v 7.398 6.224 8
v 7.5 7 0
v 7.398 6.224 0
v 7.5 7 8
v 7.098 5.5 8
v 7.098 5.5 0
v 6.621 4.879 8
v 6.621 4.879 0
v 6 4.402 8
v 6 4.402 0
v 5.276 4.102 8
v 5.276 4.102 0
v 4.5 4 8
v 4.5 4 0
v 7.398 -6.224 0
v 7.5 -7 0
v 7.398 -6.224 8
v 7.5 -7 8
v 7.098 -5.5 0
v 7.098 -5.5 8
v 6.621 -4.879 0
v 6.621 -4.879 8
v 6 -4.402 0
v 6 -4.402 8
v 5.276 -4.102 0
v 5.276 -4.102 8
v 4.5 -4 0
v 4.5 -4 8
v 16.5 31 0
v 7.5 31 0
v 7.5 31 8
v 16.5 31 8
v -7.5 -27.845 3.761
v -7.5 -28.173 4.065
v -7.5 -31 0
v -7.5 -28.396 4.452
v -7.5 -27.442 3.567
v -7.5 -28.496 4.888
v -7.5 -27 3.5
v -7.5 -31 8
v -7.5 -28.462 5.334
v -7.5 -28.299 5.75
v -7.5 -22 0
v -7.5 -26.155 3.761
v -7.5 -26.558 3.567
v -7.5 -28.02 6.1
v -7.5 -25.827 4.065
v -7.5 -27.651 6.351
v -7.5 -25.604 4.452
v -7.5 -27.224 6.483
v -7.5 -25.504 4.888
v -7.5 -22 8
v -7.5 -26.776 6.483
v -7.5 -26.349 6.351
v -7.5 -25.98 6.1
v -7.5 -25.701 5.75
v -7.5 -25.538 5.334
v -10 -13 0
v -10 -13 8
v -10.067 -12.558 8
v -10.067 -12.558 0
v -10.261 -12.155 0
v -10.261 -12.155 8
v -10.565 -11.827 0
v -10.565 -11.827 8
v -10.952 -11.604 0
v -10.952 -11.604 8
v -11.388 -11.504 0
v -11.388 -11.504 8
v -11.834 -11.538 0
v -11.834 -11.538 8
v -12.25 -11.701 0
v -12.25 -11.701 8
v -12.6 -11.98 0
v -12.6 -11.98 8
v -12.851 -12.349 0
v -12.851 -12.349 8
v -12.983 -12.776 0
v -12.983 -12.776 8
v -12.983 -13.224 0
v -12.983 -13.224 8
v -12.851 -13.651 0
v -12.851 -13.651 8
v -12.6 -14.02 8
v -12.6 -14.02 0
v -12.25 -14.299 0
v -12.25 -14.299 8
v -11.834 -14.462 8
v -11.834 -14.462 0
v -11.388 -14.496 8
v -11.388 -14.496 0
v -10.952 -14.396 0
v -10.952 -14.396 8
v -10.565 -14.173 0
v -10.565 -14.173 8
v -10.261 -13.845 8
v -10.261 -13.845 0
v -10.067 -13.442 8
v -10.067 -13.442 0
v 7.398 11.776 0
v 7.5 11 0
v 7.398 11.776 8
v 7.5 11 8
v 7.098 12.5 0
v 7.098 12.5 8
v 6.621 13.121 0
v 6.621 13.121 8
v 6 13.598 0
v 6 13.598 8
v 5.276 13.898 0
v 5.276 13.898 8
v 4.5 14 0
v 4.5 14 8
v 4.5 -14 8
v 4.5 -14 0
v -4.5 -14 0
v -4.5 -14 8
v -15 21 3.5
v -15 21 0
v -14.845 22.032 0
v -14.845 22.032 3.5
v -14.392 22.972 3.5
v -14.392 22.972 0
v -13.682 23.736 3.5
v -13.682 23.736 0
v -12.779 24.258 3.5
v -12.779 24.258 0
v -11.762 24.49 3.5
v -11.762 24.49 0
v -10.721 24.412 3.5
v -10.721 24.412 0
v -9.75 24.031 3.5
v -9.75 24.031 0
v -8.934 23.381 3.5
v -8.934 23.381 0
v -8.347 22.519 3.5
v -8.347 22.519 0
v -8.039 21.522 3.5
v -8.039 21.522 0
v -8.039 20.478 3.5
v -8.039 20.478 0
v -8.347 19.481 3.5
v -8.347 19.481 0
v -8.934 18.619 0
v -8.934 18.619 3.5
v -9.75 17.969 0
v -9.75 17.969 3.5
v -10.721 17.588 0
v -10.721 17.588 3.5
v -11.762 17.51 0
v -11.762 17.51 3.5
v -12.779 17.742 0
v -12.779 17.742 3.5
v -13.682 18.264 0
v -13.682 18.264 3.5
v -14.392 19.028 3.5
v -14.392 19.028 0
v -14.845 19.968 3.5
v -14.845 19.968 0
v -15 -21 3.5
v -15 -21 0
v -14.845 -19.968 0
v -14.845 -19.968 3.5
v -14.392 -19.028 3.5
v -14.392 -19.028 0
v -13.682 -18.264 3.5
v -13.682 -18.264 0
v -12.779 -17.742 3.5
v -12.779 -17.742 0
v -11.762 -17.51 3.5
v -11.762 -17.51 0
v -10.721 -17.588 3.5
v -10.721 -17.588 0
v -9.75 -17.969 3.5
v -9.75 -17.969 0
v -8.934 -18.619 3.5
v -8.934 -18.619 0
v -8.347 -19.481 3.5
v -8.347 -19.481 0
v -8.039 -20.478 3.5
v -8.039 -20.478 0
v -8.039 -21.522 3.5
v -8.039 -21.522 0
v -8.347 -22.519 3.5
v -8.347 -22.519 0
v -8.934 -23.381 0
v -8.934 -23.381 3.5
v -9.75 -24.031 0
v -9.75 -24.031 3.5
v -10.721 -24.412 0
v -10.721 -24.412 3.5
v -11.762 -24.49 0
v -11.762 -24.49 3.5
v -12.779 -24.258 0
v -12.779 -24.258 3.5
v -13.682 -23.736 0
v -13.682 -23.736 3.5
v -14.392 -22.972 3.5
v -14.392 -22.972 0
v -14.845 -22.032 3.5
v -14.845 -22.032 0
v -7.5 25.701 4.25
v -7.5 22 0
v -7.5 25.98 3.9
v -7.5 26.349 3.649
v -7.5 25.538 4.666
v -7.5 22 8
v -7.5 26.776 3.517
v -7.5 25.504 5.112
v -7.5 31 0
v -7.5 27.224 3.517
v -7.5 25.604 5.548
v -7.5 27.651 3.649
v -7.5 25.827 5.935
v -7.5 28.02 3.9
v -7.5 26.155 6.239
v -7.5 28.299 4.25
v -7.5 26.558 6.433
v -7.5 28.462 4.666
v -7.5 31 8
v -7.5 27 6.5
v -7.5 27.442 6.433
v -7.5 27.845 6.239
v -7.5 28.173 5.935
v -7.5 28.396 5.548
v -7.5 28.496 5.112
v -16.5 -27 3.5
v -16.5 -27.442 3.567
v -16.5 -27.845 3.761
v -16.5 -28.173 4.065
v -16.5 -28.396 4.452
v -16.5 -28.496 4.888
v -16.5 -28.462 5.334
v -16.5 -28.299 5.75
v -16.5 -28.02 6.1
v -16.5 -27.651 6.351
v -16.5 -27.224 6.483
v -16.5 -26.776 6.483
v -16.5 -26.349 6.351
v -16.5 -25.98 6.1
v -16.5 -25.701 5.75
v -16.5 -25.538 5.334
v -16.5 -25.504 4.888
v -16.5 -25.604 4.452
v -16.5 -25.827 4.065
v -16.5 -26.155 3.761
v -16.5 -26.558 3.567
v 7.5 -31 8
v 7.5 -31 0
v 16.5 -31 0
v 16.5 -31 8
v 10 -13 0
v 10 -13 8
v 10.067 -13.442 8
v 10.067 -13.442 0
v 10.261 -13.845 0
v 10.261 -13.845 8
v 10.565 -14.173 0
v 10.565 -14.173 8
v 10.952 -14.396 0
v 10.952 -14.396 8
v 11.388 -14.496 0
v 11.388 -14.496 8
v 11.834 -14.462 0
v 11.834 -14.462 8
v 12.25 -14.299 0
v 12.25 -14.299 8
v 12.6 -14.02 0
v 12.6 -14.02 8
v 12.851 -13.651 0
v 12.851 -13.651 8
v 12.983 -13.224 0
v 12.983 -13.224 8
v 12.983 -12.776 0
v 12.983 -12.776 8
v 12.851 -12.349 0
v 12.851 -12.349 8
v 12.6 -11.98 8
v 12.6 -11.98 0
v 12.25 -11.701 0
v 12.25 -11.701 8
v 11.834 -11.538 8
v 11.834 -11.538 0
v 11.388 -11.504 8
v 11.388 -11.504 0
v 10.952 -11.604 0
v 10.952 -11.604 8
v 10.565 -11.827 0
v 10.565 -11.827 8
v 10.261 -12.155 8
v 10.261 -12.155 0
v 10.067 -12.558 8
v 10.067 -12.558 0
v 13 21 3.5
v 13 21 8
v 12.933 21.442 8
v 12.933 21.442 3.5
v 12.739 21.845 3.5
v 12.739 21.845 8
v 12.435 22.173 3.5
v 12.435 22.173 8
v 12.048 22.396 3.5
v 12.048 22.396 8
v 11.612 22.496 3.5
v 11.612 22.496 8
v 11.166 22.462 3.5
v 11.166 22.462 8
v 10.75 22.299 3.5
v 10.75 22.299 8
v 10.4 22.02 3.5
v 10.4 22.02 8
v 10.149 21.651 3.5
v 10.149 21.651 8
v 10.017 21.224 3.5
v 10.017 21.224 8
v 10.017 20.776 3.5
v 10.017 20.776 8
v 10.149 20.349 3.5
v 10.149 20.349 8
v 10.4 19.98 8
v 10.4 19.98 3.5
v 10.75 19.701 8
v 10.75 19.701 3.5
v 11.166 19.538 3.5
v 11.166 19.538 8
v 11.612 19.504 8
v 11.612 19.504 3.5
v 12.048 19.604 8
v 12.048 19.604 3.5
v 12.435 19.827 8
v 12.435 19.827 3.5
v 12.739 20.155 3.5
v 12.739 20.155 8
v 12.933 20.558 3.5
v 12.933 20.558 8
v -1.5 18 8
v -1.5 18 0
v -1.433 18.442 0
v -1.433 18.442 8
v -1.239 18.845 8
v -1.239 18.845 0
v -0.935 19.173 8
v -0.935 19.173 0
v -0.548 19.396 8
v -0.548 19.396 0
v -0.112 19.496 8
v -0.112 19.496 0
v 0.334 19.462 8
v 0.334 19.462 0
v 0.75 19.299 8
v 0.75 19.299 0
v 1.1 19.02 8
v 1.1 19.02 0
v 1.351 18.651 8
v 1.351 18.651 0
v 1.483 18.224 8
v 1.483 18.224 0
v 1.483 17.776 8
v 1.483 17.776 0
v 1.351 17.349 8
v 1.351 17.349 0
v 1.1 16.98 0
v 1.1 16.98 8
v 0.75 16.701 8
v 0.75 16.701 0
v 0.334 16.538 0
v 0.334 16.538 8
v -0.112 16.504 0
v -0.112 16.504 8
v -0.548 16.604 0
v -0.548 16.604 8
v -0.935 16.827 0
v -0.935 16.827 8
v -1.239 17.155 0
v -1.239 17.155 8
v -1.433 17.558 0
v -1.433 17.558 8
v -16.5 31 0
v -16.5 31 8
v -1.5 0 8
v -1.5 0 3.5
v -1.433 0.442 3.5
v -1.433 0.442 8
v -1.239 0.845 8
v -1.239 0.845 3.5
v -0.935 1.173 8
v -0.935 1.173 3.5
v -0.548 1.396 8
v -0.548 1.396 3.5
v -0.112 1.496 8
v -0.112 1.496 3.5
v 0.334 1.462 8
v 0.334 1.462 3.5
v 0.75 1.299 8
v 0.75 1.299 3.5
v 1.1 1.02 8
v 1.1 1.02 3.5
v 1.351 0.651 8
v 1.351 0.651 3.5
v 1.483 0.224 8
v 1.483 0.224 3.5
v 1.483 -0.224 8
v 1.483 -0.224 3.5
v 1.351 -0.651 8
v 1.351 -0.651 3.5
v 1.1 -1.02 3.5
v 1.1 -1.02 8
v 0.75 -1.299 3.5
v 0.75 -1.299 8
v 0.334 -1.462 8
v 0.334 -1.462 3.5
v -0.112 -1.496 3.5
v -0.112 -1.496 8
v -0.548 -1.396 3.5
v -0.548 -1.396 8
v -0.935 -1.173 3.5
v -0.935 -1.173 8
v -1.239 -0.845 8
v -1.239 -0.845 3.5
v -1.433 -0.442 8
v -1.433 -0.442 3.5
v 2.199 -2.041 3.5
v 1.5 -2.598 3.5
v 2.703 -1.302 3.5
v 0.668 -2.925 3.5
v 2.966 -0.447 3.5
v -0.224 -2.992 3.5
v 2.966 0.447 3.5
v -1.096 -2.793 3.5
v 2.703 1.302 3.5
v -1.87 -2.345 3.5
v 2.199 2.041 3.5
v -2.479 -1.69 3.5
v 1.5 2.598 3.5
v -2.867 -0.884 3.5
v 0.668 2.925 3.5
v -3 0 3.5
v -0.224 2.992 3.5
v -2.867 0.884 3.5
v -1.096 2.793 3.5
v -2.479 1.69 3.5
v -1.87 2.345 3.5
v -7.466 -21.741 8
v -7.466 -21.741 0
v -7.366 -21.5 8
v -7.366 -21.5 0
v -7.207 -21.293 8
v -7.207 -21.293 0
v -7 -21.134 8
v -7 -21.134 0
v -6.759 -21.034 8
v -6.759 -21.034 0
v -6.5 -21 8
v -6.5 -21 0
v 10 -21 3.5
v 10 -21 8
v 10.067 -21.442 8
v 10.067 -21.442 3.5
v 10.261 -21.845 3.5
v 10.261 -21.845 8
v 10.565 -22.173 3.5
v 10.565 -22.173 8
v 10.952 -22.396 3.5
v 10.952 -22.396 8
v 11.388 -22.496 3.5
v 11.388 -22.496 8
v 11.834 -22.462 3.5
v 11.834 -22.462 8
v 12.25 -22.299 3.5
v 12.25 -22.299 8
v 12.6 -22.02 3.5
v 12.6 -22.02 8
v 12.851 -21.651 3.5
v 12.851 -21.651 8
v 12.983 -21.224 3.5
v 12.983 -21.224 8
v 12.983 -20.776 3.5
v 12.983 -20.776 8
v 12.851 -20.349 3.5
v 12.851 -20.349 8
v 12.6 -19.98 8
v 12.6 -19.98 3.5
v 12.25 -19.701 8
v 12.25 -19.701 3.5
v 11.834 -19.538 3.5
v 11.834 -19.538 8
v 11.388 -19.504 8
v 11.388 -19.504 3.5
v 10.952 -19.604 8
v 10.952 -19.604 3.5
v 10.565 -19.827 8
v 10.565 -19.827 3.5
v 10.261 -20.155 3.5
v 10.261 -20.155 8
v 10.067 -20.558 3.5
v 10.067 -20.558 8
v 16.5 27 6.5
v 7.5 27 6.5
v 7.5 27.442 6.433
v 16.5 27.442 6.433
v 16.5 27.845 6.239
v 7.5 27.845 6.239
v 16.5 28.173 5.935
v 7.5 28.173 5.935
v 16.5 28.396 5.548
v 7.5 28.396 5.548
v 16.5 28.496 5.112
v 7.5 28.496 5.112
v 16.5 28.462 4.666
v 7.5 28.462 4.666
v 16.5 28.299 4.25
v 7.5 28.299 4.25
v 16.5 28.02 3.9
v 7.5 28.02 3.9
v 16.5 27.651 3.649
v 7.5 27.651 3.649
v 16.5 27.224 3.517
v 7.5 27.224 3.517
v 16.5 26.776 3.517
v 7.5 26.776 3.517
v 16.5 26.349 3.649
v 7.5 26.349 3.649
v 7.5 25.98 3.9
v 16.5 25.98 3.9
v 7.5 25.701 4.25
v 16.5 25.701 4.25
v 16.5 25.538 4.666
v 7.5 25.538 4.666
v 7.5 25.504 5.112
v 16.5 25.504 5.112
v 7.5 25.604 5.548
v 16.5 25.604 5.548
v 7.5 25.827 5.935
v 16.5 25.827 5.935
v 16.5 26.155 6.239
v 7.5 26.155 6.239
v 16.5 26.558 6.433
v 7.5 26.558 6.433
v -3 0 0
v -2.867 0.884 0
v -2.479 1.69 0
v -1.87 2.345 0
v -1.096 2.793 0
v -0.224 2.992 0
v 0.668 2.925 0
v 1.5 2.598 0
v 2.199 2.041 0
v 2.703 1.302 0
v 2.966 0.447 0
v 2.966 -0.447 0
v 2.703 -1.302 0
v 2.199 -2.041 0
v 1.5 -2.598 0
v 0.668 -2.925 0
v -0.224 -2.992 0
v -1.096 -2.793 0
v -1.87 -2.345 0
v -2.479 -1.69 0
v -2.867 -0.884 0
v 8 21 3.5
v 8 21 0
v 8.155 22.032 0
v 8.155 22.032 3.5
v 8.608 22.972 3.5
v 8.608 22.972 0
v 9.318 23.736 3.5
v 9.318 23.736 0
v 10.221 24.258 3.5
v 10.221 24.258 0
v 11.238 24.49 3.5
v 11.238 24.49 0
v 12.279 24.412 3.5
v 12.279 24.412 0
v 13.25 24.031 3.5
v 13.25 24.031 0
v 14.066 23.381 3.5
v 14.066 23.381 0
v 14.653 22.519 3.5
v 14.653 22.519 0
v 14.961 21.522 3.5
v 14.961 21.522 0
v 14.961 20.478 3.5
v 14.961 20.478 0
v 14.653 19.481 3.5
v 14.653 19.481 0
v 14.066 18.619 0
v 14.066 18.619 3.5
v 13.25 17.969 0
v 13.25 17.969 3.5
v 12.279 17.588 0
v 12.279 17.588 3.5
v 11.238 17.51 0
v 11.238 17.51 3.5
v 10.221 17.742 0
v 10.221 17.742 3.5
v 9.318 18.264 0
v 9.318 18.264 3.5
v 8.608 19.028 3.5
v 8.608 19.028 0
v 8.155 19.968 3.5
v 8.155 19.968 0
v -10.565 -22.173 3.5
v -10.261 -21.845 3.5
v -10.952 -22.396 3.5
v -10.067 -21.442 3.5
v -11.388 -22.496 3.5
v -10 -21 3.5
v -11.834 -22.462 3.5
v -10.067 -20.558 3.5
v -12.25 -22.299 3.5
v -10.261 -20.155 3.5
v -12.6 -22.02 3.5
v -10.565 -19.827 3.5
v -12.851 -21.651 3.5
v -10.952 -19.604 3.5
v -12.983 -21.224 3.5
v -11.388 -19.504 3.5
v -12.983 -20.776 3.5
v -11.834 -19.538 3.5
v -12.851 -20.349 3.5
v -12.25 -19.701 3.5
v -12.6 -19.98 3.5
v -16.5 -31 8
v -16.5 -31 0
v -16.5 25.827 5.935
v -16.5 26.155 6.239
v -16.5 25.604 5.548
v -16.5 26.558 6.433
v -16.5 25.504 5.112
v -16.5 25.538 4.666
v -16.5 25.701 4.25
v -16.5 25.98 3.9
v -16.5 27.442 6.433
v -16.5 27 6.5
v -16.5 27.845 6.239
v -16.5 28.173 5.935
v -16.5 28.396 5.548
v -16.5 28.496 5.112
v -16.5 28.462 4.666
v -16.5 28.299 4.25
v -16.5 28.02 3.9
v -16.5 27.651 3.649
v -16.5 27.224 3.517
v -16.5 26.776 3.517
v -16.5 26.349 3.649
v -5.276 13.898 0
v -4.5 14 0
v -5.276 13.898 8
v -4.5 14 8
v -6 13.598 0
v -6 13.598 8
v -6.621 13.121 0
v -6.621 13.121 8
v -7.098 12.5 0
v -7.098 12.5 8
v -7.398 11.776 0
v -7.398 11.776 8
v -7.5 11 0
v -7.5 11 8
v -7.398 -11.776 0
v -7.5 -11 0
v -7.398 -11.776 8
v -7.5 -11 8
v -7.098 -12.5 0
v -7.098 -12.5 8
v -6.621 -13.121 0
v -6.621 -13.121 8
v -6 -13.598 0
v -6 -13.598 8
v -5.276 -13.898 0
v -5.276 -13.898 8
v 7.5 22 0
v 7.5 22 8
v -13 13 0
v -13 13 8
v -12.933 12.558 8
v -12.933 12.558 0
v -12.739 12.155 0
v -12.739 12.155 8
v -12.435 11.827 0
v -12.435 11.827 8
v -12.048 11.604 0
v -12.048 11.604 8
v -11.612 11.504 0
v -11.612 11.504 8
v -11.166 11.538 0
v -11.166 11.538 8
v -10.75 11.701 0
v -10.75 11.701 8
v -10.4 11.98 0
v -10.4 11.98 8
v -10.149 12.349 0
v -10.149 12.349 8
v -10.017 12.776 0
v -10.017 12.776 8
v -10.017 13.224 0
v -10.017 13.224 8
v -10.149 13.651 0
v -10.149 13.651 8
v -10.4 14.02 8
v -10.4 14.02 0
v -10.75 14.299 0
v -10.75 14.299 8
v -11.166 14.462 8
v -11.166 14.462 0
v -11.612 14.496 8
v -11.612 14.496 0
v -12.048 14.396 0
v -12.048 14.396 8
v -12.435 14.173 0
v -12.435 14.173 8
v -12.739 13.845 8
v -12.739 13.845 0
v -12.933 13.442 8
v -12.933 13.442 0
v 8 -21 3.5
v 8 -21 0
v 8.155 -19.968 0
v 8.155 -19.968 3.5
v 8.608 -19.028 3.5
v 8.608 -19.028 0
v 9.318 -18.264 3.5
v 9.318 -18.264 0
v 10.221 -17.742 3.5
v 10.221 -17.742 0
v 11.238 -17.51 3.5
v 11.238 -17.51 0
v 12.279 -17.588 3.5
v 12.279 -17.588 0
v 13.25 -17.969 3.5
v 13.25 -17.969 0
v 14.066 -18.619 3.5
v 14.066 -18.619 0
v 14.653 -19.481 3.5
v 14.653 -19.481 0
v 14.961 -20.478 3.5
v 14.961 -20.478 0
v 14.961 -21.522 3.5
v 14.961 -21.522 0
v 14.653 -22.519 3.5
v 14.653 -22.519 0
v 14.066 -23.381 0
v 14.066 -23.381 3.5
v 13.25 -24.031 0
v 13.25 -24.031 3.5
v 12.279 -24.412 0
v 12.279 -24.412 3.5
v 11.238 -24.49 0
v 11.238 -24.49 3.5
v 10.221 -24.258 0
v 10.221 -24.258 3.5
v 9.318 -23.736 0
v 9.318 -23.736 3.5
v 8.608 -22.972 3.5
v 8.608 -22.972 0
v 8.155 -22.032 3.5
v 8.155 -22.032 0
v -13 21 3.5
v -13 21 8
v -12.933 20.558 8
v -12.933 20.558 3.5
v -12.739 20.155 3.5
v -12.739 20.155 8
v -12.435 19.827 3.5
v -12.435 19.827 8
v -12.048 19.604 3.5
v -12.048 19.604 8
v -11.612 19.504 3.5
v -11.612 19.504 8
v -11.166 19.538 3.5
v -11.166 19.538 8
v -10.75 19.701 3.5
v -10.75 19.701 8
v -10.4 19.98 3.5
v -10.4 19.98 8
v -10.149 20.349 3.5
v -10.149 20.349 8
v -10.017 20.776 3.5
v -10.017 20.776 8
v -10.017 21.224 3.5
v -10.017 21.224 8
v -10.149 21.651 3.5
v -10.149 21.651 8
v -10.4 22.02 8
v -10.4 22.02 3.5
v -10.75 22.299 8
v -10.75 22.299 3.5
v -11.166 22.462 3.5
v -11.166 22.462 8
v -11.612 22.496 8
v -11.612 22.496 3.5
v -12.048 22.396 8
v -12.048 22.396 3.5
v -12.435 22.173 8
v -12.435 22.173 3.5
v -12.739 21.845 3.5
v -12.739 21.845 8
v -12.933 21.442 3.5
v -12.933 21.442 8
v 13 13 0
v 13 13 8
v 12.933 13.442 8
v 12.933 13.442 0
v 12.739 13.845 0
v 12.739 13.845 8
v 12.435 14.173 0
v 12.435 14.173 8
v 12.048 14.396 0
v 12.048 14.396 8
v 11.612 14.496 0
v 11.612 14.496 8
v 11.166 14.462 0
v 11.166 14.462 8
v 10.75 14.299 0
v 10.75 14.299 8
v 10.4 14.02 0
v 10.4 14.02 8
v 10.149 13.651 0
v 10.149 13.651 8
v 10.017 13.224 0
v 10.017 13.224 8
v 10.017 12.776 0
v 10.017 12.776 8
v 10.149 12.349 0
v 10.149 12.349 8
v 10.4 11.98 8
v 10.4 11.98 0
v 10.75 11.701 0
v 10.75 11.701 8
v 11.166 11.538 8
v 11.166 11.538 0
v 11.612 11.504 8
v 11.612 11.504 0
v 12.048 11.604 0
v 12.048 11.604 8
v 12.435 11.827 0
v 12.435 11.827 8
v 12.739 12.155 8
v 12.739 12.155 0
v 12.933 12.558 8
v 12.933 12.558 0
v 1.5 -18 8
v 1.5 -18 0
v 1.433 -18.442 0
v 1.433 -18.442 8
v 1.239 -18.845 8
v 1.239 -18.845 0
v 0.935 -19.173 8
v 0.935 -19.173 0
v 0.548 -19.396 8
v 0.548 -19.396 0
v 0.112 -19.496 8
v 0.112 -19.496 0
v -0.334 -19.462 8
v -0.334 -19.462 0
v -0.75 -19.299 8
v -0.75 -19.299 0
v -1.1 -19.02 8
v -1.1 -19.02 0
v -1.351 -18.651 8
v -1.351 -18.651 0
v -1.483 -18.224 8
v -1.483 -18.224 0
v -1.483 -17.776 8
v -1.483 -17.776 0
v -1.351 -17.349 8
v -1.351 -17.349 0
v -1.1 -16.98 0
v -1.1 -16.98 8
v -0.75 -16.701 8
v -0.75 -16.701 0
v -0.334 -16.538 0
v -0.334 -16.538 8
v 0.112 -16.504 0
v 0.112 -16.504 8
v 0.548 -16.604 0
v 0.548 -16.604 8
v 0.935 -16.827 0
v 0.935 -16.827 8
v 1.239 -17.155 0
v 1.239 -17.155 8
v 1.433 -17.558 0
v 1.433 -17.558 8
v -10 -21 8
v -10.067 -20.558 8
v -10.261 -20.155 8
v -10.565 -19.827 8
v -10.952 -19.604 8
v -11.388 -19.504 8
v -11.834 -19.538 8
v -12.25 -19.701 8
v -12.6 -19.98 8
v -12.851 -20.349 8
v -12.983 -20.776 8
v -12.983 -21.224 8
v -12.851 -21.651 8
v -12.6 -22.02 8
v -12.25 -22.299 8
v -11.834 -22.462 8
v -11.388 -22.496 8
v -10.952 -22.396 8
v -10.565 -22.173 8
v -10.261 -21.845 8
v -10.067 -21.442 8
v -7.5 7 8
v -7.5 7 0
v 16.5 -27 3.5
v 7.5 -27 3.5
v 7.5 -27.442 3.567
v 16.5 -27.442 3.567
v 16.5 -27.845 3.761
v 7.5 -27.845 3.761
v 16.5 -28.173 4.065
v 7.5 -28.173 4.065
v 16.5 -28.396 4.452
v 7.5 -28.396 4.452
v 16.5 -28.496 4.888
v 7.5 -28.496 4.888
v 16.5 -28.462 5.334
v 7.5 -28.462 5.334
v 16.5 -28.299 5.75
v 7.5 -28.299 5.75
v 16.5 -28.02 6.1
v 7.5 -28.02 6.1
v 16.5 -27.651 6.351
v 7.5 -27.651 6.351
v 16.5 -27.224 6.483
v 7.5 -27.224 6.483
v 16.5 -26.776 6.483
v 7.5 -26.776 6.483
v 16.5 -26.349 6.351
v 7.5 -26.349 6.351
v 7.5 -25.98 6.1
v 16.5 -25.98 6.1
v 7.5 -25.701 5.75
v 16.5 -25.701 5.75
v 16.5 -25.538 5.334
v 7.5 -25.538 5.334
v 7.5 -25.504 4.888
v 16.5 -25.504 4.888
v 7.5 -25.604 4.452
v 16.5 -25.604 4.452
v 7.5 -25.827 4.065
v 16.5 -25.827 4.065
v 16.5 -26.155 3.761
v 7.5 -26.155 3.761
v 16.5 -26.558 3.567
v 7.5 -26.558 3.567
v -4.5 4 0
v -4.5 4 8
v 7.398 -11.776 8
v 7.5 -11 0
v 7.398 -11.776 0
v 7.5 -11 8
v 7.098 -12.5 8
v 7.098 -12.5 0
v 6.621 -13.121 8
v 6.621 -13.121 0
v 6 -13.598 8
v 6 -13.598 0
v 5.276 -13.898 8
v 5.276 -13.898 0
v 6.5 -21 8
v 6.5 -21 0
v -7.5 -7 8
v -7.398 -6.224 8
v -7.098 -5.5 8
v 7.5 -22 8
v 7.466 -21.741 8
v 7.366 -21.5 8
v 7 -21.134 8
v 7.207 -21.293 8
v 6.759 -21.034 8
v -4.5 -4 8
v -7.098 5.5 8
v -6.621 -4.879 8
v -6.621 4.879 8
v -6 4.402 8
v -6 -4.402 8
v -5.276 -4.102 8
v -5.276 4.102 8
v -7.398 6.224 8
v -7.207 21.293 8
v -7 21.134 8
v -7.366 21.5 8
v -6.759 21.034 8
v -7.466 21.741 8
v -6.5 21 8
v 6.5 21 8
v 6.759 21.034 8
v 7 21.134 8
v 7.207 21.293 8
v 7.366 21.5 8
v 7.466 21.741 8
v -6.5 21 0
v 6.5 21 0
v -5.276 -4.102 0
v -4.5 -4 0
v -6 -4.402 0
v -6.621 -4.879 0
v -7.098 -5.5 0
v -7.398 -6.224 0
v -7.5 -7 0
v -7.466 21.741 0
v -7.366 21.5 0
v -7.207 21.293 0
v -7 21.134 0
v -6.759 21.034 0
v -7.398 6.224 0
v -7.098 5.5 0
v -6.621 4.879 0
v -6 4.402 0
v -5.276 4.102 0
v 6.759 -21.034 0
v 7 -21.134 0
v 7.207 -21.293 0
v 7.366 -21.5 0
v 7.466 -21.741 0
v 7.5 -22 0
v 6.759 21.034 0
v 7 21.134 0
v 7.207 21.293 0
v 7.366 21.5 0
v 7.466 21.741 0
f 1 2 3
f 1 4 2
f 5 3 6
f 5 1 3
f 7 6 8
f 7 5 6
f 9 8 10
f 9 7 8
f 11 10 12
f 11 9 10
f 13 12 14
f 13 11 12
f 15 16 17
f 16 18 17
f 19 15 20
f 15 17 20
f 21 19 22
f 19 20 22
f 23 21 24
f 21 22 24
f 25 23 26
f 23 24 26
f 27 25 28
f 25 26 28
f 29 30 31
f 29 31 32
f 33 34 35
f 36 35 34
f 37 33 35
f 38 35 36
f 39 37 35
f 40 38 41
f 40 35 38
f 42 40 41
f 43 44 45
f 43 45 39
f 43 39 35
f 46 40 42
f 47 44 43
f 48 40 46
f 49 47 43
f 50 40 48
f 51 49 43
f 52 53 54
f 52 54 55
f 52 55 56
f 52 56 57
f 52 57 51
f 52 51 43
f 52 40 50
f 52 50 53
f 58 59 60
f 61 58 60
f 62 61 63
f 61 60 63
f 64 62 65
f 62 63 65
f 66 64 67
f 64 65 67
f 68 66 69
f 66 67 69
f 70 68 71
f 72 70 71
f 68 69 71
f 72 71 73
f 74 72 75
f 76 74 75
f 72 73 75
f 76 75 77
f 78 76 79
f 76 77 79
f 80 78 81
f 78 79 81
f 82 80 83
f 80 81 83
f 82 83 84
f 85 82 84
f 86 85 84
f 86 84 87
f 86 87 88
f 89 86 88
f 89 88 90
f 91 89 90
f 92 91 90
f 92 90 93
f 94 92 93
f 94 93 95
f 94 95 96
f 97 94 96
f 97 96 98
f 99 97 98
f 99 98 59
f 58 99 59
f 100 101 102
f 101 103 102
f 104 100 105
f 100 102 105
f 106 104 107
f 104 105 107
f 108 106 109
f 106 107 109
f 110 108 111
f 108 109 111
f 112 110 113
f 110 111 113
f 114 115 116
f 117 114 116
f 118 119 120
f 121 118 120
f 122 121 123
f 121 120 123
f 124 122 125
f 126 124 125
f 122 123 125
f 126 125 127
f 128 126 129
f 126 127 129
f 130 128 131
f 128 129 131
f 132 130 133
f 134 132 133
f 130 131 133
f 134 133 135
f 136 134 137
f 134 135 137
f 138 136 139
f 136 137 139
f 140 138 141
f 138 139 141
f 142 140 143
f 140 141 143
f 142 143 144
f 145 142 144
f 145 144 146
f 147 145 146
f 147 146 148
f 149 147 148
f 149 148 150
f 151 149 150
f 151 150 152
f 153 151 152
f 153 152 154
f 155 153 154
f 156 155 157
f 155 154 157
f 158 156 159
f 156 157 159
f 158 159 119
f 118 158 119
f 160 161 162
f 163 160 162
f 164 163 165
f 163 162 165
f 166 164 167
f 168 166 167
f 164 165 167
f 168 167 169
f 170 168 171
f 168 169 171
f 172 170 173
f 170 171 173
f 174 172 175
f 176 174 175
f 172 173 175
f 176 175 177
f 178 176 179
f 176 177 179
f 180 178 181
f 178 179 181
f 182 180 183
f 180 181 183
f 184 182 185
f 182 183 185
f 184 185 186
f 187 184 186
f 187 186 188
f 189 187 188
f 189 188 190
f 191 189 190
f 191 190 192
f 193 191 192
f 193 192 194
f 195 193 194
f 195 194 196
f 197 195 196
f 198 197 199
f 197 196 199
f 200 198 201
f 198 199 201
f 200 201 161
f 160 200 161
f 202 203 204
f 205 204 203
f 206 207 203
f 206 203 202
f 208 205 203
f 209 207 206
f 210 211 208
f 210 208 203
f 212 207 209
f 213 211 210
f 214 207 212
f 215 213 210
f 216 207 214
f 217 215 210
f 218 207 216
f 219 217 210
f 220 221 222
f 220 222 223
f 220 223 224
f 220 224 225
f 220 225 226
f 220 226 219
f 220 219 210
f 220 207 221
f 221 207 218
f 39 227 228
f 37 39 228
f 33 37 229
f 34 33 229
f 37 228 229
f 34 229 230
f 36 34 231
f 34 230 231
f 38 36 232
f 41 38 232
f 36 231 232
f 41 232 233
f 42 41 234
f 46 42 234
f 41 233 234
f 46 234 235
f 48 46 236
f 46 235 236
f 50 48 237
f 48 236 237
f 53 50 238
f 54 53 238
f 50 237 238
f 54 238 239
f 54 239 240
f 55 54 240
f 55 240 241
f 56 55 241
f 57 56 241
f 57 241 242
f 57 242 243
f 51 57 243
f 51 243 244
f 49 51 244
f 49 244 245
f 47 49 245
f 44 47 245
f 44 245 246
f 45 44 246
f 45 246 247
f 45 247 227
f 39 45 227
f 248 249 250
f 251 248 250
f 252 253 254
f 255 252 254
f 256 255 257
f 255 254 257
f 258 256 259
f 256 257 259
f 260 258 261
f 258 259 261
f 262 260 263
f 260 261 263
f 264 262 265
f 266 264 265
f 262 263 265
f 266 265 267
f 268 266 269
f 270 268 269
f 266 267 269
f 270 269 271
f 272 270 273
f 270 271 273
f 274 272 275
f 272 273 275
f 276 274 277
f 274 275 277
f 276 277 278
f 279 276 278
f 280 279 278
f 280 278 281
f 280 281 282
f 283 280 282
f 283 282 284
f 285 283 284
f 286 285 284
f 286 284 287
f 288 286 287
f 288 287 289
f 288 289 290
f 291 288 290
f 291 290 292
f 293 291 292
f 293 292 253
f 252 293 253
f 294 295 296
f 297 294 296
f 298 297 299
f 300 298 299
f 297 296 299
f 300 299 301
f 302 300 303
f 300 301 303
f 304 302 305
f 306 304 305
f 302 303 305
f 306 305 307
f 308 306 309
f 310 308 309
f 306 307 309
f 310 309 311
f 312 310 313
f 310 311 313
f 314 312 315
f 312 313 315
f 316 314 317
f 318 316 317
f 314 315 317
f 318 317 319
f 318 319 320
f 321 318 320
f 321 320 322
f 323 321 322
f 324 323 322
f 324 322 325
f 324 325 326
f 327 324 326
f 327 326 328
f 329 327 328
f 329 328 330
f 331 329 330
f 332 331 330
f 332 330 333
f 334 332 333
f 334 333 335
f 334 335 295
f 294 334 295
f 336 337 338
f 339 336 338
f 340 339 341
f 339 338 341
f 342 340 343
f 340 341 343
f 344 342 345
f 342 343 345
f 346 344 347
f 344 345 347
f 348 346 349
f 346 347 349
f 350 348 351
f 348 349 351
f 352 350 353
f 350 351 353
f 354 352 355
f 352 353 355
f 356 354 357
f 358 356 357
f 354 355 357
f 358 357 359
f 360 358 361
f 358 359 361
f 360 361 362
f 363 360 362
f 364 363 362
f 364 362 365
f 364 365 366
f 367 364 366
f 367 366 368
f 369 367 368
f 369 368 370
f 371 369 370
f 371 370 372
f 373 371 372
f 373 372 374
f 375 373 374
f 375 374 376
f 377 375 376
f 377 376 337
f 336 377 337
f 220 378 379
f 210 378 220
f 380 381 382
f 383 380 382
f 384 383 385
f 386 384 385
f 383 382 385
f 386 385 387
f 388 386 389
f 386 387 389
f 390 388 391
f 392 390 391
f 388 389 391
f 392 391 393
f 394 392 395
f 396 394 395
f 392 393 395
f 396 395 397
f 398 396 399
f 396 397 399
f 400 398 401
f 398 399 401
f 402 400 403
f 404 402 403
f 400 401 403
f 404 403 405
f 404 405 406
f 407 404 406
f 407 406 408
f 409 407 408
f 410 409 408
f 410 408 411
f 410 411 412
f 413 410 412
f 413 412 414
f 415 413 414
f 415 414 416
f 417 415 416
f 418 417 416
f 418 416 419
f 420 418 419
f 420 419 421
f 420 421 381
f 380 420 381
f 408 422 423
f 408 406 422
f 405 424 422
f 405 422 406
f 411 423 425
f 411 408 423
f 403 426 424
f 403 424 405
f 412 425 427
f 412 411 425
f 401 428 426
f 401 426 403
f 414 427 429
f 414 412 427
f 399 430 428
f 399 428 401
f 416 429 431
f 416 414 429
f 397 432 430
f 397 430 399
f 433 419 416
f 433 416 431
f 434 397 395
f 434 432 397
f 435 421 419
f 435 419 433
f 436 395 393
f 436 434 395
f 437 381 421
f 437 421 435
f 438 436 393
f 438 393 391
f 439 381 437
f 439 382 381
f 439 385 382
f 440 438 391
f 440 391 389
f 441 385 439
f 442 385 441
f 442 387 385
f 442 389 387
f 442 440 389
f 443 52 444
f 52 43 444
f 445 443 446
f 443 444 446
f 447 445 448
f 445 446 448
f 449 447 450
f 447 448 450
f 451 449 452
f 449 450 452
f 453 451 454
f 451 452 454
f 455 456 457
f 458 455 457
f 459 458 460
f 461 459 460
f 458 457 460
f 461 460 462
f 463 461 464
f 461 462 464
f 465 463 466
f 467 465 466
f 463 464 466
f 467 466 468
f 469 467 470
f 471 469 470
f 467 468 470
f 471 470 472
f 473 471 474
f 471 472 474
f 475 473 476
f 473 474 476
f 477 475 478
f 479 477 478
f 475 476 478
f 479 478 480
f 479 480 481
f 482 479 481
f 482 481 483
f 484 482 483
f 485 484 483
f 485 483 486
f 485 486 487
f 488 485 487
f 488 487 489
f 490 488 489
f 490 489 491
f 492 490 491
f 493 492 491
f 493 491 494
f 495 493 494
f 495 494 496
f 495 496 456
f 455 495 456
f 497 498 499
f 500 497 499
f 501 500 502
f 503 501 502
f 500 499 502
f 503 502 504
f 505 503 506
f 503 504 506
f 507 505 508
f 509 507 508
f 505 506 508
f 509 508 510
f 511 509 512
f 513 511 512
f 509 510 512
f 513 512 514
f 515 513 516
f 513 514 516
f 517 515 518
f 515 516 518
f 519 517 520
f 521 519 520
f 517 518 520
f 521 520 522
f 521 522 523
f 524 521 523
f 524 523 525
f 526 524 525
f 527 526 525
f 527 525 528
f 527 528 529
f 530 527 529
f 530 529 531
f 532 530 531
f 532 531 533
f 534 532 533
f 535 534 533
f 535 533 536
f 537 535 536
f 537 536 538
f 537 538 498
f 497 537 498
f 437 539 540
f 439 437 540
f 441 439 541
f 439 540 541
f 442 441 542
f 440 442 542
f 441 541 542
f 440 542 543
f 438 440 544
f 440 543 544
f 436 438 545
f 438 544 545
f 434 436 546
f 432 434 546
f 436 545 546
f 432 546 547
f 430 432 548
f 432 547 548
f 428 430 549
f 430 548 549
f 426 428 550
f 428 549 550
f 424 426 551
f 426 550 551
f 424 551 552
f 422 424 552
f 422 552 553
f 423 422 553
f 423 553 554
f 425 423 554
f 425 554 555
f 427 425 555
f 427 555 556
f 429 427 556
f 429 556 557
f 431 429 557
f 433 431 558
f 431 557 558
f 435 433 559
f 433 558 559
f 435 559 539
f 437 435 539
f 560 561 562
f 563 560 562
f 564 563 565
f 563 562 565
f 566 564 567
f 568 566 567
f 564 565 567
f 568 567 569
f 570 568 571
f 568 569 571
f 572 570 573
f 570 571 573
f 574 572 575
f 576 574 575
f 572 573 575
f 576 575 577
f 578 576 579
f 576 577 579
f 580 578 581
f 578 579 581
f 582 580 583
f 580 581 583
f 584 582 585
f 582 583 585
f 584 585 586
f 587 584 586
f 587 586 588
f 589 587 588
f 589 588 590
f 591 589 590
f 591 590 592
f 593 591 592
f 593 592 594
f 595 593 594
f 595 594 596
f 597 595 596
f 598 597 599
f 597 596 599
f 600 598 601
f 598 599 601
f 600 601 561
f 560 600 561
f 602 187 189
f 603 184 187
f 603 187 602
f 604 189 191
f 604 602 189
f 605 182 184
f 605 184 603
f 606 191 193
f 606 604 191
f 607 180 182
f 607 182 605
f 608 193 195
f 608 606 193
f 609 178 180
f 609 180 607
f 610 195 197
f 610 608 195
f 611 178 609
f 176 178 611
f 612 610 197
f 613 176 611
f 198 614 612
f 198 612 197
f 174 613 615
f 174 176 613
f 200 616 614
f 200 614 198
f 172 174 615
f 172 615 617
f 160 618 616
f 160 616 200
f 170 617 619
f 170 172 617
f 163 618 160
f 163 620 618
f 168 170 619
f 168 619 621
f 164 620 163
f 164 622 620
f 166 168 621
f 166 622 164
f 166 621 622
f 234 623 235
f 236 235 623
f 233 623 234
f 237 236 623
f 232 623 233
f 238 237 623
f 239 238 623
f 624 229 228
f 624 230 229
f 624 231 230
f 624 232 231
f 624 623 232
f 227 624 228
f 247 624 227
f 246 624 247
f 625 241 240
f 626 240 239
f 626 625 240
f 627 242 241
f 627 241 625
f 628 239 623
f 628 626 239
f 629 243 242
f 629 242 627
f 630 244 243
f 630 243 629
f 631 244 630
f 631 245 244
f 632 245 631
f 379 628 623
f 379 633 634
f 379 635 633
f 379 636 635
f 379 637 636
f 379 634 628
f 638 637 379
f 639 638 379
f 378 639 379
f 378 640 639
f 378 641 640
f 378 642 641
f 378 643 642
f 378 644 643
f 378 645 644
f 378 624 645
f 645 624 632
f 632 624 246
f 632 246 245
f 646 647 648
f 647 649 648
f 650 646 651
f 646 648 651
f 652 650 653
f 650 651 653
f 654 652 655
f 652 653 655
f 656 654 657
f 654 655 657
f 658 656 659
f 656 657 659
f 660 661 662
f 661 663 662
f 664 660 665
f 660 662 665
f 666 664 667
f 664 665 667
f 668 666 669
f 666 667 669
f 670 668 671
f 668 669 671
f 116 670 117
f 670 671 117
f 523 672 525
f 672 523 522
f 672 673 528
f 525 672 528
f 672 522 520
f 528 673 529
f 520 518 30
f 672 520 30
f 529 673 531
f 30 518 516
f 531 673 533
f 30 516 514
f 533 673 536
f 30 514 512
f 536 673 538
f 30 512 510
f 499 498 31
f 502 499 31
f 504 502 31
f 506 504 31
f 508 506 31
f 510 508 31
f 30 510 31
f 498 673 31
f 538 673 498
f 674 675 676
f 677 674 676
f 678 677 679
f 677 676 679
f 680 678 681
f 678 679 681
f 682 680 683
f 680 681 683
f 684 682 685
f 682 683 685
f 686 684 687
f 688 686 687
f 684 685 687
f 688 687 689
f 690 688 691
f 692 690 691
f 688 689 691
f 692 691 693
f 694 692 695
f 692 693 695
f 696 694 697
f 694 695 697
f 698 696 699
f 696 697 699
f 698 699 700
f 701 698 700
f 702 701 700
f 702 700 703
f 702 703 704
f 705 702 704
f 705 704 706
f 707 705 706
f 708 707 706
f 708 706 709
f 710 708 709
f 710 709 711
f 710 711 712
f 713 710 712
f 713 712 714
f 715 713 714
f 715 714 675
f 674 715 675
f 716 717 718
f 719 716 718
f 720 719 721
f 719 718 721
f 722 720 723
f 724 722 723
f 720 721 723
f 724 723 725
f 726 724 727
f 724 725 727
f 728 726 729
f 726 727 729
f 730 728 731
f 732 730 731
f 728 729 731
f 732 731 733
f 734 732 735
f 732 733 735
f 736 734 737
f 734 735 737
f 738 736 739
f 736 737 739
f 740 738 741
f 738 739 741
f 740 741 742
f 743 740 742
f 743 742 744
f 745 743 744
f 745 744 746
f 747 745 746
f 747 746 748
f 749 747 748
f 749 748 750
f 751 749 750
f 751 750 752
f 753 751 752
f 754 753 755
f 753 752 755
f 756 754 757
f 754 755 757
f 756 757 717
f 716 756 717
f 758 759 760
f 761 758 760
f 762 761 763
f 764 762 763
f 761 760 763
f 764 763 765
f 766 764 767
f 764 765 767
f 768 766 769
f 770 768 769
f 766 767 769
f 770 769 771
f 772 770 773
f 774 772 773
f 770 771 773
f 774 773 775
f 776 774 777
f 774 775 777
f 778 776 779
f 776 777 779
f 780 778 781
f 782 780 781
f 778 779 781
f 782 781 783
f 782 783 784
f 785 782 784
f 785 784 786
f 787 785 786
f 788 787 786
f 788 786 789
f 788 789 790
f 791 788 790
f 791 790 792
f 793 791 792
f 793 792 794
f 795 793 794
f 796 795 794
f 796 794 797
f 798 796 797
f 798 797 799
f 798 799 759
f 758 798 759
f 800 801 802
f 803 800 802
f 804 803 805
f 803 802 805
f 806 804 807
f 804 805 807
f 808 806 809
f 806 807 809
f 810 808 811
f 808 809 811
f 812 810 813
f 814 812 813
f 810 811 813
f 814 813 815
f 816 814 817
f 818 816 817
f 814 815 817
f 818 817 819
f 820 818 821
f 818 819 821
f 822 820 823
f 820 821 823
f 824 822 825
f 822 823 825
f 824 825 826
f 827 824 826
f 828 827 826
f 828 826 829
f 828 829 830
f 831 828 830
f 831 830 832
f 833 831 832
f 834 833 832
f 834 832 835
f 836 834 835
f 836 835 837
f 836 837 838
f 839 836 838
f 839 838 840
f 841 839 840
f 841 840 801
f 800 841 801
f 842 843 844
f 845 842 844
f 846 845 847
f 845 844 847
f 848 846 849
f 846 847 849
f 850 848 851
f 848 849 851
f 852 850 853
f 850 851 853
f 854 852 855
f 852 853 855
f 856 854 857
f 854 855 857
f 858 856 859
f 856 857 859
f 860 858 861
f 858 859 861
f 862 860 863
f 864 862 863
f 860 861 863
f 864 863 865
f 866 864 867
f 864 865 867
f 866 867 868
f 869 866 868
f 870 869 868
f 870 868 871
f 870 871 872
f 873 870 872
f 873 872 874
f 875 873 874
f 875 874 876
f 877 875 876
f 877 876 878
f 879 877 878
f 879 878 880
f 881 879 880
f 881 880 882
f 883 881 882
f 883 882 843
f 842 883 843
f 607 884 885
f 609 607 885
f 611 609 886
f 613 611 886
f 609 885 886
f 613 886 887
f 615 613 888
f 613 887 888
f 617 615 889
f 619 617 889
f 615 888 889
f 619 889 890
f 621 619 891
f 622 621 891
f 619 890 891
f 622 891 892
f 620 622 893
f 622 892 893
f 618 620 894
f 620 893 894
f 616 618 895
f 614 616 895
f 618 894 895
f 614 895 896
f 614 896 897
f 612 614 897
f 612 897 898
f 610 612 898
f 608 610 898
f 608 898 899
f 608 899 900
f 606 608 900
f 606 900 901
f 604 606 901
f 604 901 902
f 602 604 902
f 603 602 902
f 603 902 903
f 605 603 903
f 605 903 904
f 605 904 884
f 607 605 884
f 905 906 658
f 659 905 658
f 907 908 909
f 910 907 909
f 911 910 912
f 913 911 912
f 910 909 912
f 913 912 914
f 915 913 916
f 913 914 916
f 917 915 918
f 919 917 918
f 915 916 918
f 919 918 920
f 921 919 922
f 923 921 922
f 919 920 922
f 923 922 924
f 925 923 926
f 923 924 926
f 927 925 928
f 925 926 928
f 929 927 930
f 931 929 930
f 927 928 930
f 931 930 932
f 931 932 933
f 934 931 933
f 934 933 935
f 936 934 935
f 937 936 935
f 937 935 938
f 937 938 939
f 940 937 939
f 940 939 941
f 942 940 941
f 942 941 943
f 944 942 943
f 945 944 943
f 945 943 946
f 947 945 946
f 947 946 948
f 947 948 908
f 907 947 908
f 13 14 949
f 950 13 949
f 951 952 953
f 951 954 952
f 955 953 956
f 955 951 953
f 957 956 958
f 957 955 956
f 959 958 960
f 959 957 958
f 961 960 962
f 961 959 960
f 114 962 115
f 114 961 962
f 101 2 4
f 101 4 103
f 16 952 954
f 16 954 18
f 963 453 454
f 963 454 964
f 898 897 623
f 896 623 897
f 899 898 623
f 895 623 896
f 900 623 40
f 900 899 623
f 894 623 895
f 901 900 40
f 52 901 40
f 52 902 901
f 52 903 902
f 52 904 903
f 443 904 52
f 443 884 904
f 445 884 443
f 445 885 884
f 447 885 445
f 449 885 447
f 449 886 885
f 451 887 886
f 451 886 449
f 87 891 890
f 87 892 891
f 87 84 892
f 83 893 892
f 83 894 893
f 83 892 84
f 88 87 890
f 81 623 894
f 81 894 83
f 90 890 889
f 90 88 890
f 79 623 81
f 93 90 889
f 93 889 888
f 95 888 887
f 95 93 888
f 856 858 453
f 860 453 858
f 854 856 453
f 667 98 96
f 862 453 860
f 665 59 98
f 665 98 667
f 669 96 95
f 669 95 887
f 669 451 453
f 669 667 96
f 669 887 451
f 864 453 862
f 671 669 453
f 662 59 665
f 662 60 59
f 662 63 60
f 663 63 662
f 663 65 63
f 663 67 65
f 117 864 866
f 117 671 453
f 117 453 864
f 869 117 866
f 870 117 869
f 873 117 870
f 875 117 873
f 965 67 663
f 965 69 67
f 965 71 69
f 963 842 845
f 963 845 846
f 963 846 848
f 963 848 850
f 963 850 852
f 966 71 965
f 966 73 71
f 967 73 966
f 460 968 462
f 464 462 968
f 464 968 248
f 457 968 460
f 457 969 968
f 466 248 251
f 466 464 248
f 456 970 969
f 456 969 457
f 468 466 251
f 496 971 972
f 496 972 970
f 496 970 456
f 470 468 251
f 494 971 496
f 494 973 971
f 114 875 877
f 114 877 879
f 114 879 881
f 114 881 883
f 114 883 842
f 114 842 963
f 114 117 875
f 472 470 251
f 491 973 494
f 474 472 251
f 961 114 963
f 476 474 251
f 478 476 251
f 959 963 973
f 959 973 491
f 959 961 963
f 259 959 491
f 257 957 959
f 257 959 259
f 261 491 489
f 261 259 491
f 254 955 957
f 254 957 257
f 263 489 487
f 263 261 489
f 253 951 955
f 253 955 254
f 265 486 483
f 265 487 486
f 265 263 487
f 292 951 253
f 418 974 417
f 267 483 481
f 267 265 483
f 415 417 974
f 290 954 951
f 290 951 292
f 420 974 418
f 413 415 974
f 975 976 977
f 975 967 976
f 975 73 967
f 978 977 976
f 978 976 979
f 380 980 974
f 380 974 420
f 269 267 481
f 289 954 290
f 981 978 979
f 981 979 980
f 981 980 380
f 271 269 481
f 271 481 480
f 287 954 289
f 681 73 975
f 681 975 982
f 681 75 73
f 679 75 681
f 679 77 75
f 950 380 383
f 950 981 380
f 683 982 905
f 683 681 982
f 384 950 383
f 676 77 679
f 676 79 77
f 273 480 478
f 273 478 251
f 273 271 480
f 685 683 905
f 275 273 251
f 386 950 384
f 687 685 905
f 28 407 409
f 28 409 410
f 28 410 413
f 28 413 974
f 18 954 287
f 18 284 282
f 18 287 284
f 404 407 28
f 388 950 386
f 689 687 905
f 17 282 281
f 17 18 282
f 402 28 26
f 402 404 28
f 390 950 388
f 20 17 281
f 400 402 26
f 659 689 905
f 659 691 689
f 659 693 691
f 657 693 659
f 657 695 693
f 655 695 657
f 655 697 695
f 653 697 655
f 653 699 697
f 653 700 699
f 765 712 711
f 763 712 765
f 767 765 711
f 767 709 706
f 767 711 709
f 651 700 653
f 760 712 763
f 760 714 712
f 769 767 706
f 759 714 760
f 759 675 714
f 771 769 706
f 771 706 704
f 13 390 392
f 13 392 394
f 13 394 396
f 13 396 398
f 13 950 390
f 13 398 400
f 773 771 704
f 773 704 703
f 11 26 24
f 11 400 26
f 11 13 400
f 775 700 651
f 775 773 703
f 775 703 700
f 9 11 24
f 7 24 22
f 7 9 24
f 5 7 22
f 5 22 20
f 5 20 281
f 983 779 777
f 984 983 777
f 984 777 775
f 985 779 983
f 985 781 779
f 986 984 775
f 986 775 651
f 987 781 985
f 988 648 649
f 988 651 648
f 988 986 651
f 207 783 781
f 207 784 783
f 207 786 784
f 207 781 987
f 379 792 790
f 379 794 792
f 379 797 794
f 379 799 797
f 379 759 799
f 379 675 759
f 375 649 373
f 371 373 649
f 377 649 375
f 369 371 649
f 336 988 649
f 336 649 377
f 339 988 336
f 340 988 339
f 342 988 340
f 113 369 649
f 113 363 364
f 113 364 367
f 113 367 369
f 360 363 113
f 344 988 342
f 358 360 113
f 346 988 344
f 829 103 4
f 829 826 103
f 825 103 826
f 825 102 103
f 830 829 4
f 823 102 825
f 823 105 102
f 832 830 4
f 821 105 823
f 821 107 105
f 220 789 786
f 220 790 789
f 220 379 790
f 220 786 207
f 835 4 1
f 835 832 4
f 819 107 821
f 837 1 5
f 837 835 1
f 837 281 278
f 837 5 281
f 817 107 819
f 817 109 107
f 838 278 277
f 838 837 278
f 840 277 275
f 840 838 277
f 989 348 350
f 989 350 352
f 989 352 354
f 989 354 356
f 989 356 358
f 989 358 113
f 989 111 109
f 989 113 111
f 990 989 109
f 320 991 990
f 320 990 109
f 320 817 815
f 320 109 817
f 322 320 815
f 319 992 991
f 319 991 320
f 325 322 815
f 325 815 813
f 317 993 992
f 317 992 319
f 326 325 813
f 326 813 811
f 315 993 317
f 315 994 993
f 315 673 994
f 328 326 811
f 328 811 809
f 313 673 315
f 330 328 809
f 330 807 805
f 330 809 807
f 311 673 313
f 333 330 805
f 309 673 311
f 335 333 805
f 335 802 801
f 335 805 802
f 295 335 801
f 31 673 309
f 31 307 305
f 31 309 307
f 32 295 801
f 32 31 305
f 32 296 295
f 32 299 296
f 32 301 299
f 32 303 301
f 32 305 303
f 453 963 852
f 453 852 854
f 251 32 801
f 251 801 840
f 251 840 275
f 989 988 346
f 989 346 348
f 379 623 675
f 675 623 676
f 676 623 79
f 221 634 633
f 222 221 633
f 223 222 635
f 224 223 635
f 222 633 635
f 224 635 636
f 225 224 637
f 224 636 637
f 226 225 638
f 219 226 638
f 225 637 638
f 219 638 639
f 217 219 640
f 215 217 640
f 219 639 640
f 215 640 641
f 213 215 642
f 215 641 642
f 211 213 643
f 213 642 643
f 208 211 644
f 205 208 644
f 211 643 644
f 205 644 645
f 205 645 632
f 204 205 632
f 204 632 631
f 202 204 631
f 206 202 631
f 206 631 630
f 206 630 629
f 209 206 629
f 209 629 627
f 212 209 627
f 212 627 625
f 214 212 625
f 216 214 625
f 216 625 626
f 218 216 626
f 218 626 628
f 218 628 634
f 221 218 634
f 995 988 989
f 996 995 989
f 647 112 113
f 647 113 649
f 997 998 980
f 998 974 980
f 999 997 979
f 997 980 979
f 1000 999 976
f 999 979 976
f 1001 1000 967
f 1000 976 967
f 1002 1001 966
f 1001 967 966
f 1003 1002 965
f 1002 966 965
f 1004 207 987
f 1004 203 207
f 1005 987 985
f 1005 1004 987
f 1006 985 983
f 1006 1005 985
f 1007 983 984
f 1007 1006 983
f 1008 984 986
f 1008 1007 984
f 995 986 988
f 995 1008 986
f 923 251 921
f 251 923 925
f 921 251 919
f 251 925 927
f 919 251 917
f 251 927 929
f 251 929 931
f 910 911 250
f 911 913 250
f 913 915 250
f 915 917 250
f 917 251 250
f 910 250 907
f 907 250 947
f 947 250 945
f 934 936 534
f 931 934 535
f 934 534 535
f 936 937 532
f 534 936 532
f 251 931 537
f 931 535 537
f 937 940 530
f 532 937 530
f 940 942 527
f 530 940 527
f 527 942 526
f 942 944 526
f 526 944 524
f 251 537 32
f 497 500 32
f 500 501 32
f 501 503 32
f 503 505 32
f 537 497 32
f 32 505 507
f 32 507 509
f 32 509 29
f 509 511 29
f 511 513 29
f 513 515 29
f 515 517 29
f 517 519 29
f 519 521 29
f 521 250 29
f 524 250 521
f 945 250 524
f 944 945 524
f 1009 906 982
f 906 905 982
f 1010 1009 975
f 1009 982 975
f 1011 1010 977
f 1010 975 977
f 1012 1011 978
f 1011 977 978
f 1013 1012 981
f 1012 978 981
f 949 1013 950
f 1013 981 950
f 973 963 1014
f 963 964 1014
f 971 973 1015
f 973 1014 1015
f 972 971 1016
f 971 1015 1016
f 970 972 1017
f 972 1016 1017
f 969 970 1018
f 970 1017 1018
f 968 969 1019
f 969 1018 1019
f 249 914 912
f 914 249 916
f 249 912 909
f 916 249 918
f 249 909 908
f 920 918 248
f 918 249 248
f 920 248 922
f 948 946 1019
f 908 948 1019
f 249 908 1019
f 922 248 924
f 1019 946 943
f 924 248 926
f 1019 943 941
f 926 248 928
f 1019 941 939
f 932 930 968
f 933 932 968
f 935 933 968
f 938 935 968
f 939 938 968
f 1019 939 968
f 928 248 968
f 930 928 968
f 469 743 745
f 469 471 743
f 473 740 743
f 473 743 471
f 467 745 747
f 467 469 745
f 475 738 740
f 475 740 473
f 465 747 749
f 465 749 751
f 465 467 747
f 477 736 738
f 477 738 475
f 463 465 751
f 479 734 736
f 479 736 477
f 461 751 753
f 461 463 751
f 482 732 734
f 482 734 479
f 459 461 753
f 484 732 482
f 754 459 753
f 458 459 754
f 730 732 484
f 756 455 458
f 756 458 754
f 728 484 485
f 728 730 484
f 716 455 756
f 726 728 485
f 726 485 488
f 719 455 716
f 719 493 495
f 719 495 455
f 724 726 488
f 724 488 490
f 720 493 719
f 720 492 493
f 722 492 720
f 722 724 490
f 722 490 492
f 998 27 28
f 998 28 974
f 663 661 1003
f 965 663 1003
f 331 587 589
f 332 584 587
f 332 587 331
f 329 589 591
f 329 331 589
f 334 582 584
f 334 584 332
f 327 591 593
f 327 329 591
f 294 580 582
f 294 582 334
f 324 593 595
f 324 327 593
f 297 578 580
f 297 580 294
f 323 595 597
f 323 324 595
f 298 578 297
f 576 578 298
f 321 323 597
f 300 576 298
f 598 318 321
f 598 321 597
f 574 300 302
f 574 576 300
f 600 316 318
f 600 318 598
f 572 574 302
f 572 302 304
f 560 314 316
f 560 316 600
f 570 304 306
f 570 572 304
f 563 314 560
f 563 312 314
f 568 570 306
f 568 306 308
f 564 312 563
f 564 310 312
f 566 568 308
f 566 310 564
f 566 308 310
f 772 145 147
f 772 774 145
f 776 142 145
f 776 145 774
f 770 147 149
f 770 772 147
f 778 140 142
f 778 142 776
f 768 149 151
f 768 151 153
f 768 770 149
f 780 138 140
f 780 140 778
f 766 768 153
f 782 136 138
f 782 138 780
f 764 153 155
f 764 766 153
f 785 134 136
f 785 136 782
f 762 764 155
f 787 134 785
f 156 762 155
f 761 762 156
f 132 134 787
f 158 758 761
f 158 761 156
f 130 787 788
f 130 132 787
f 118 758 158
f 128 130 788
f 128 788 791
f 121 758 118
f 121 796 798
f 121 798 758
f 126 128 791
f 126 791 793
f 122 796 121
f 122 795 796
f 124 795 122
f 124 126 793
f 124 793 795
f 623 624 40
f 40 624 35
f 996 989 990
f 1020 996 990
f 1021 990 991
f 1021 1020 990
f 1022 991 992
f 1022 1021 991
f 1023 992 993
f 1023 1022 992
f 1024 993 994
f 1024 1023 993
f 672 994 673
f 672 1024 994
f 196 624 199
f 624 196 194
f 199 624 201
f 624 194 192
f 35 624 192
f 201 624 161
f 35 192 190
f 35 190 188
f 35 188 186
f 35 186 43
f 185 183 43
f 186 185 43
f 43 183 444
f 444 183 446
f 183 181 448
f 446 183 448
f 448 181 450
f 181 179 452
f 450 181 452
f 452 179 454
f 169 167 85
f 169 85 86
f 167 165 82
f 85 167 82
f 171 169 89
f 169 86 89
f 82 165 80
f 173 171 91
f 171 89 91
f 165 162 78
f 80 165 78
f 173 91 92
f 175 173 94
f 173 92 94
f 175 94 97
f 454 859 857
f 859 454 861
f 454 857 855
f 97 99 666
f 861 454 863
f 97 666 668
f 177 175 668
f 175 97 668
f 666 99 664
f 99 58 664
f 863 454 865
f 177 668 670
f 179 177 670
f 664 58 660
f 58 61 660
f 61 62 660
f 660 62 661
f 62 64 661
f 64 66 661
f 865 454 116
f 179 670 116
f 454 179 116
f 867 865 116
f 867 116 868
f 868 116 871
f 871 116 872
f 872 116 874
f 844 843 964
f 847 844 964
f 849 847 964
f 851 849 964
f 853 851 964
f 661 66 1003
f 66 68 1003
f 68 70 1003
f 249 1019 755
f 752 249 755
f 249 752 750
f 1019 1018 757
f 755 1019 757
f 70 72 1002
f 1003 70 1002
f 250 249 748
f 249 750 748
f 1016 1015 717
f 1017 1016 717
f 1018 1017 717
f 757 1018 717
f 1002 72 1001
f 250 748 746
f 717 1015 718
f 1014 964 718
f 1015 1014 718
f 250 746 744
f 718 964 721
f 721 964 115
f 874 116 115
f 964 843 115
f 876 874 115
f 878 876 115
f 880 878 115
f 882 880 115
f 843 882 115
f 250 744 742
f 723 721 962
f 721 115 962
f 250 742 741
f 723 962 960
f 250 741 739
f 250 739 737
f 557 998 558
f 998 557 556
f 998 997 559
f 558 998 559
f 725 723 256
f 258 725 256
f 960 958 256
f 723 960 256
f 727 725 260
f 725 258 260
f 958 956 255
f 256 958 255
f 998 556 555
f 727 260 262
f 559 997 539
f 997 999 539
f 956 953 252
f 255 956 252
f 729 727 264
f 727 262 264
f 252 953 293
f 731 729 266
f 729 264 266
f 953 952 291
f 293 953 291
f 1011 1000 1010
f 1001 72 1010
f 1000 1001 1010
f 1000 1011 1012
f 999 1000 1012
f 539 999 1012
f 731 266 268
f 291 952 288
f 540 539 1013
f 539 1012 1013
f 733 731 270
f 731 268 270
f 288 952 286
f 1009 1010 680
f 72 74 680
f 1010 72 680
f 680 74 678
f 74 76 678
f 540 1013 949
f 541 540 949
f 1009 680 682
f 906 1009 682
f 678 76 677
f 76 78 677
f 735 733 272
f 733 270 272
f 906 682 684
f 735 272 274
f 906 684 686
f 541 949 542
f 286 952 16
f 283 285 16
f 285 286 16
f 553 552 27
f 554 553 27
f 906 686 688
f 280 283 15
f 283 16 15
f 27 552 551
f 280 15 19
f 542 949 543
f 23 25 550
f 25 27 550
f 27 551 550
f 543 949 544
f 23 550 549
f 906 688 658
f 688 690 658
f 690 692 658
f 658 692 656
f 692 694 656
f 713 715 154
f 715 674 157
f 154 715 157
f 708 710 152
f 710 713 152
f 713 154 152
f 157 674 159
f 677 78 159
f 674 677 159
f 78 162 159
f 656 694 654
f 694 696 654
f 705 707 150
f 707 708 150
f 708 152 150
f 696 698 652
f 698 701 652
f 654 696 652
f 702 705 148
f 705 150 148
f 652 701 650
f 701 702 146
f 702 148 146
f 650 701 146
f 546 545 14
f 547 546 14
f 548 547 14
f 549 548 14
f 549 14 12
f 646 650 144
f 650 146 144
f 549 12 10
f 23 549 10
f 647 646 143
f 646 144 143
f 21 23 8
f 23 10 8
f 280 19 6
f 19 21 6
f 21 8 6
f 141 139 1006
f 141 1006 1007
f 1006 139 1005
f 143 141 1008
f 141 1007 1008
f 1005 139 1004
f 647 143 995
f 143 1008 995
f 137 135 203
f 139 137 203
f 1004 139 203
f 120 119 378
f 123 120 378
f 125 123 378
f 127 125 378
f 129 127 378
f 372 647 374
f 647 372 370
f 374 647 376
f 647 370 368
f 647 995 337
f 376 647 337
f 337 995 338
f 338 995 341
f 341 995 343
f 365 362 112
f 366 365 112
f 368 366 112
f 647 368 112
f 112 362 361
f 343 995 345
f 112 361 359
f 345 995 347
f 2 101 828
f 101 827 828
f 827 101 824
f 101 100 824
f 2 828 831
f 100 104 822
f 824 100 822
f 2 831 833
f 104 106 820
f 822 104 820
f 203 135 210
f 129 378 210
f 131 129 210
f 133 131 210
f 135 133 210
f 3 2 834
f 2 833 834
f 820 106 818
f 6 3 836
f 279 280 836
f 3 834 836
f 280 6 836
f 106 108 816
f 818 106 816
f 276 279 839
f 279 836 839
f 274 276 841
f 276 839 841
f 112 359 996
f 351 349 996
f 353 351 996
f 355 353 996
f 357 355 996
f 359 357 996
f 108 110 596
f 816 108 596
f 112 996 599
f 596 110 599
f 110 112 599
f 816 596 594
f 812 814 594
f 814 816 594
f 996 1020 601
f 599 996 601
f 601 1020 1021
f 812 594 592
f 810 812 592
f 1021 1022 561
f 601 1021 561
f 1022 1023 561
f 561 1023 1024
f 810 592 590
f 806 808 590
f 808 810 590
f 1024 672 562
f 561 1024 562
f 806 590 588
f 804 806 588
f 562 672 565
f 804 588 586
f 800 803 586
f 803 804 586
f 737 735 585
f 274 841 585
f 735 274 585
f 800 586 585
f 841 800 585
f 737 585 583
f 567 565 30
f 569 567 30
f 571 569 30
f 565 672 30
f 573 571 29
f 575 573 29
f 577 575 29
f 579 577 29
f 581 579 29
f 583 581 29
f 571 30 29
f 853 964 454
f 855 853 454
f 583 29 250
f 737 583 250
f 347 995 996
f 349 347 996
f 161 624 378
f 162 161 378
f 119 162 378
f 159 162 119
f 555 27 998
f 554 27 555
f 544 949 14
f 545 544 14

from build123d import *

# Parameters (mm, degrees)
SKETCH_1_W          = 33
SKETCH_1_H          = 62
EXTRUDE_1_DEPTH     = 8
SKETCH_2_W          = 15
SKETCH_2_H          = 10
CUT_EXTRUDE_1_DEPTH = 37.017356927
SKETCH_3_R          = 1.5
CUT_EXTRUDE_2_DEPTH = 37.017356927
SKETCH_4_R          = 1.5
CUT_EXTRUDE_3_DEPTH = 46.97825573
FILLET_2_R          = 1
SKETCH_5_R          = 1.5
CUT_EXTRUDE_4_DEPTH = 37.017356927
SKETCH_7_W          = 15
SKETCH_7_H          = 10
CUT_EXTRUDE_5_DEPTH = 37.017356927
FILLET_3_R          = 3
SKETCH_8_R          = 3.5
SKETCH_8_R_2        = 3
CUT_EXTRUDE_6_DEPTH = 3.5


with BuildPart() as part:
    # 草图1 → 凸台-拉伸1 (new body)
    with BuildSketch(Plane.XY):
        Rectangle(SKETCH_1_W, SKETCH_1_H)
    extrude(amount=EXTRUDE_1_DEPTH)

    # 草图2 → 切除-拉伸1 (cut, through all)
    with BuildSketch(Plane.XY.offset(8)):
        with Locations((0, 26)):
            Rectangle(SKETCH_2_W, SKETCH_2_H)
        with Locations((0, -26)):
            Rectangle(SKETCH_2_W, SKETCH_2_H)
    extrude(amount=-CUT_EXTRUDE_1_DEPTH, mode=Mode.SUBTRACT)

    # 草图3 → 切除-拉伸2 (cut, through all)
    with BuildSketch(Plane.XY.offset(8)):
        with Locations((11.5, 13)):
            Circle(SKETCH_3_R)
        with Locations((11.5, 21)):
            Circle(SKETCH_3_R)
        with Locations(Location((11.5, -21, 0), (0, 0, 180))):
            Circle(SKETCH_3_R)
        with Locations(Location((11.5, -13, 0), (0, 0, 180))):
            Circle(SKETCH_3_R)
        with Locations((-11.5, -13)):
            Circle(SKETCH_3_R)
        with Locations((-11.5, -21)):
            Circle(SKETCH_3_R)
        with Locations(Location((-11.5, 21, 0), (0, 0, 180))):
            Circle(SKETCH_3_R)
        with Locations(Location((-11.5, 13, 0), (0, 0, 180))):
            Circle(SKETCH_3_R)
    extrude(amount=-CUT_EXTRUDE_2_DEPTH, mode=Mode.SUBTRACT)

    # 草图4 → 切除-拉伸3 (cut, through all)
    with BuildSketch(Plane.ZY.offset(16.5)):
        with Locations((5, 27)):
            Circle(SKETCH_4_R)
        with Locations(Location((5, -27, 0), (0, 0, 180))):
            Circle(SKETCH_4_R)
    extrude(amount=-CUT_EXTRUDE_3_DEPTH, mode=Mode.SUBTRACT)

    # 圆角2
    fillet_2_edges = [part.edges().sort_by_distance(p)[0] for p in [
        (7.5, 21, 4),
        (-7.5, 21, 4),
        (-7.5, -21, 4),
        (7.5, -21, 4),
    ]]
    fillet(fillet_2_edges, radius=FILLET_2_R)

    # 草图5 → 切除-拉伸4 (cut, through all)
    with BuildSketch(Plane(origin=(0, 0, 0), x_dir=(-1, 0, 0), z_dir=(0, 0, -1))):
        Circle(SKETCH_5_R)
        with Locations((0, 18)):
            Circle(SKETCH_5_R)
        with Locations(Location((0, -18, 0), (0, 0, 180))):
            Circle(SKETCH_5_R)
    extrude(amount=-CUT_EXTRUDE_4_DEPTH, mode=Mode.SUBTRACT)

    # 草图7 → 切除-拉伸5 (cut, through all)
    with BuildSketch(Plane(origin=(0, 0, 0), x_dir=(-1, 0, 0), z_dir=(0, 0, -1))):
        with Locations((0, 9)):
            Rectangle(SKETCH_7_W, SKETCH_7_H)
        with Locations((0, -9)):
            Rectangle(SKETCH_7_W, SKETCH_7_H)
    extrude(amount=-CUT_EXTRUDE_5_DEPTH, mode=Mode.SUBTRACT)

    # 圆角3
    fillet_3_edges = [part.edges().sort_by_distance(p)[0] for p in [
        (-7.5, 14, 4),
        (-7.5, 4, 4),
        (7.5, 4, 4),
        (7.5, 14, 4),
        (7.5, -14, 4),
        (7.5, -4, 4),
        (-7.5, -4, 4),
        (-7.5, -14, 4),
    ]]
    fillet(fillet_3_edges, radius=FILLET_3_R)

    # 草图8 → 切除-拉伸6 (cut)
    with BuildSketch(Plane(origin=(0, 0, 0), x_dir=(-1, 0, 0), z_dir=(0, 0, -1))):
        with Locations((11.5, 21)):
            Circle(SKETCH_8_R)
        with Locations((-11.5, 21)):
            Circle(SKETCH_8_R)
        with Locations((-11.5, -21)):
            Circle(SKETCH_8_R)
        with Locations((11.5, -21)):
            Circle(SKETCH_8_R)
        Circle(SKETCH_8_R_2)
    extrude(amount=-CUT_EXTRUDE_6_DEPTH, mode=Mode.SUBTRACT)


solid = part.part
